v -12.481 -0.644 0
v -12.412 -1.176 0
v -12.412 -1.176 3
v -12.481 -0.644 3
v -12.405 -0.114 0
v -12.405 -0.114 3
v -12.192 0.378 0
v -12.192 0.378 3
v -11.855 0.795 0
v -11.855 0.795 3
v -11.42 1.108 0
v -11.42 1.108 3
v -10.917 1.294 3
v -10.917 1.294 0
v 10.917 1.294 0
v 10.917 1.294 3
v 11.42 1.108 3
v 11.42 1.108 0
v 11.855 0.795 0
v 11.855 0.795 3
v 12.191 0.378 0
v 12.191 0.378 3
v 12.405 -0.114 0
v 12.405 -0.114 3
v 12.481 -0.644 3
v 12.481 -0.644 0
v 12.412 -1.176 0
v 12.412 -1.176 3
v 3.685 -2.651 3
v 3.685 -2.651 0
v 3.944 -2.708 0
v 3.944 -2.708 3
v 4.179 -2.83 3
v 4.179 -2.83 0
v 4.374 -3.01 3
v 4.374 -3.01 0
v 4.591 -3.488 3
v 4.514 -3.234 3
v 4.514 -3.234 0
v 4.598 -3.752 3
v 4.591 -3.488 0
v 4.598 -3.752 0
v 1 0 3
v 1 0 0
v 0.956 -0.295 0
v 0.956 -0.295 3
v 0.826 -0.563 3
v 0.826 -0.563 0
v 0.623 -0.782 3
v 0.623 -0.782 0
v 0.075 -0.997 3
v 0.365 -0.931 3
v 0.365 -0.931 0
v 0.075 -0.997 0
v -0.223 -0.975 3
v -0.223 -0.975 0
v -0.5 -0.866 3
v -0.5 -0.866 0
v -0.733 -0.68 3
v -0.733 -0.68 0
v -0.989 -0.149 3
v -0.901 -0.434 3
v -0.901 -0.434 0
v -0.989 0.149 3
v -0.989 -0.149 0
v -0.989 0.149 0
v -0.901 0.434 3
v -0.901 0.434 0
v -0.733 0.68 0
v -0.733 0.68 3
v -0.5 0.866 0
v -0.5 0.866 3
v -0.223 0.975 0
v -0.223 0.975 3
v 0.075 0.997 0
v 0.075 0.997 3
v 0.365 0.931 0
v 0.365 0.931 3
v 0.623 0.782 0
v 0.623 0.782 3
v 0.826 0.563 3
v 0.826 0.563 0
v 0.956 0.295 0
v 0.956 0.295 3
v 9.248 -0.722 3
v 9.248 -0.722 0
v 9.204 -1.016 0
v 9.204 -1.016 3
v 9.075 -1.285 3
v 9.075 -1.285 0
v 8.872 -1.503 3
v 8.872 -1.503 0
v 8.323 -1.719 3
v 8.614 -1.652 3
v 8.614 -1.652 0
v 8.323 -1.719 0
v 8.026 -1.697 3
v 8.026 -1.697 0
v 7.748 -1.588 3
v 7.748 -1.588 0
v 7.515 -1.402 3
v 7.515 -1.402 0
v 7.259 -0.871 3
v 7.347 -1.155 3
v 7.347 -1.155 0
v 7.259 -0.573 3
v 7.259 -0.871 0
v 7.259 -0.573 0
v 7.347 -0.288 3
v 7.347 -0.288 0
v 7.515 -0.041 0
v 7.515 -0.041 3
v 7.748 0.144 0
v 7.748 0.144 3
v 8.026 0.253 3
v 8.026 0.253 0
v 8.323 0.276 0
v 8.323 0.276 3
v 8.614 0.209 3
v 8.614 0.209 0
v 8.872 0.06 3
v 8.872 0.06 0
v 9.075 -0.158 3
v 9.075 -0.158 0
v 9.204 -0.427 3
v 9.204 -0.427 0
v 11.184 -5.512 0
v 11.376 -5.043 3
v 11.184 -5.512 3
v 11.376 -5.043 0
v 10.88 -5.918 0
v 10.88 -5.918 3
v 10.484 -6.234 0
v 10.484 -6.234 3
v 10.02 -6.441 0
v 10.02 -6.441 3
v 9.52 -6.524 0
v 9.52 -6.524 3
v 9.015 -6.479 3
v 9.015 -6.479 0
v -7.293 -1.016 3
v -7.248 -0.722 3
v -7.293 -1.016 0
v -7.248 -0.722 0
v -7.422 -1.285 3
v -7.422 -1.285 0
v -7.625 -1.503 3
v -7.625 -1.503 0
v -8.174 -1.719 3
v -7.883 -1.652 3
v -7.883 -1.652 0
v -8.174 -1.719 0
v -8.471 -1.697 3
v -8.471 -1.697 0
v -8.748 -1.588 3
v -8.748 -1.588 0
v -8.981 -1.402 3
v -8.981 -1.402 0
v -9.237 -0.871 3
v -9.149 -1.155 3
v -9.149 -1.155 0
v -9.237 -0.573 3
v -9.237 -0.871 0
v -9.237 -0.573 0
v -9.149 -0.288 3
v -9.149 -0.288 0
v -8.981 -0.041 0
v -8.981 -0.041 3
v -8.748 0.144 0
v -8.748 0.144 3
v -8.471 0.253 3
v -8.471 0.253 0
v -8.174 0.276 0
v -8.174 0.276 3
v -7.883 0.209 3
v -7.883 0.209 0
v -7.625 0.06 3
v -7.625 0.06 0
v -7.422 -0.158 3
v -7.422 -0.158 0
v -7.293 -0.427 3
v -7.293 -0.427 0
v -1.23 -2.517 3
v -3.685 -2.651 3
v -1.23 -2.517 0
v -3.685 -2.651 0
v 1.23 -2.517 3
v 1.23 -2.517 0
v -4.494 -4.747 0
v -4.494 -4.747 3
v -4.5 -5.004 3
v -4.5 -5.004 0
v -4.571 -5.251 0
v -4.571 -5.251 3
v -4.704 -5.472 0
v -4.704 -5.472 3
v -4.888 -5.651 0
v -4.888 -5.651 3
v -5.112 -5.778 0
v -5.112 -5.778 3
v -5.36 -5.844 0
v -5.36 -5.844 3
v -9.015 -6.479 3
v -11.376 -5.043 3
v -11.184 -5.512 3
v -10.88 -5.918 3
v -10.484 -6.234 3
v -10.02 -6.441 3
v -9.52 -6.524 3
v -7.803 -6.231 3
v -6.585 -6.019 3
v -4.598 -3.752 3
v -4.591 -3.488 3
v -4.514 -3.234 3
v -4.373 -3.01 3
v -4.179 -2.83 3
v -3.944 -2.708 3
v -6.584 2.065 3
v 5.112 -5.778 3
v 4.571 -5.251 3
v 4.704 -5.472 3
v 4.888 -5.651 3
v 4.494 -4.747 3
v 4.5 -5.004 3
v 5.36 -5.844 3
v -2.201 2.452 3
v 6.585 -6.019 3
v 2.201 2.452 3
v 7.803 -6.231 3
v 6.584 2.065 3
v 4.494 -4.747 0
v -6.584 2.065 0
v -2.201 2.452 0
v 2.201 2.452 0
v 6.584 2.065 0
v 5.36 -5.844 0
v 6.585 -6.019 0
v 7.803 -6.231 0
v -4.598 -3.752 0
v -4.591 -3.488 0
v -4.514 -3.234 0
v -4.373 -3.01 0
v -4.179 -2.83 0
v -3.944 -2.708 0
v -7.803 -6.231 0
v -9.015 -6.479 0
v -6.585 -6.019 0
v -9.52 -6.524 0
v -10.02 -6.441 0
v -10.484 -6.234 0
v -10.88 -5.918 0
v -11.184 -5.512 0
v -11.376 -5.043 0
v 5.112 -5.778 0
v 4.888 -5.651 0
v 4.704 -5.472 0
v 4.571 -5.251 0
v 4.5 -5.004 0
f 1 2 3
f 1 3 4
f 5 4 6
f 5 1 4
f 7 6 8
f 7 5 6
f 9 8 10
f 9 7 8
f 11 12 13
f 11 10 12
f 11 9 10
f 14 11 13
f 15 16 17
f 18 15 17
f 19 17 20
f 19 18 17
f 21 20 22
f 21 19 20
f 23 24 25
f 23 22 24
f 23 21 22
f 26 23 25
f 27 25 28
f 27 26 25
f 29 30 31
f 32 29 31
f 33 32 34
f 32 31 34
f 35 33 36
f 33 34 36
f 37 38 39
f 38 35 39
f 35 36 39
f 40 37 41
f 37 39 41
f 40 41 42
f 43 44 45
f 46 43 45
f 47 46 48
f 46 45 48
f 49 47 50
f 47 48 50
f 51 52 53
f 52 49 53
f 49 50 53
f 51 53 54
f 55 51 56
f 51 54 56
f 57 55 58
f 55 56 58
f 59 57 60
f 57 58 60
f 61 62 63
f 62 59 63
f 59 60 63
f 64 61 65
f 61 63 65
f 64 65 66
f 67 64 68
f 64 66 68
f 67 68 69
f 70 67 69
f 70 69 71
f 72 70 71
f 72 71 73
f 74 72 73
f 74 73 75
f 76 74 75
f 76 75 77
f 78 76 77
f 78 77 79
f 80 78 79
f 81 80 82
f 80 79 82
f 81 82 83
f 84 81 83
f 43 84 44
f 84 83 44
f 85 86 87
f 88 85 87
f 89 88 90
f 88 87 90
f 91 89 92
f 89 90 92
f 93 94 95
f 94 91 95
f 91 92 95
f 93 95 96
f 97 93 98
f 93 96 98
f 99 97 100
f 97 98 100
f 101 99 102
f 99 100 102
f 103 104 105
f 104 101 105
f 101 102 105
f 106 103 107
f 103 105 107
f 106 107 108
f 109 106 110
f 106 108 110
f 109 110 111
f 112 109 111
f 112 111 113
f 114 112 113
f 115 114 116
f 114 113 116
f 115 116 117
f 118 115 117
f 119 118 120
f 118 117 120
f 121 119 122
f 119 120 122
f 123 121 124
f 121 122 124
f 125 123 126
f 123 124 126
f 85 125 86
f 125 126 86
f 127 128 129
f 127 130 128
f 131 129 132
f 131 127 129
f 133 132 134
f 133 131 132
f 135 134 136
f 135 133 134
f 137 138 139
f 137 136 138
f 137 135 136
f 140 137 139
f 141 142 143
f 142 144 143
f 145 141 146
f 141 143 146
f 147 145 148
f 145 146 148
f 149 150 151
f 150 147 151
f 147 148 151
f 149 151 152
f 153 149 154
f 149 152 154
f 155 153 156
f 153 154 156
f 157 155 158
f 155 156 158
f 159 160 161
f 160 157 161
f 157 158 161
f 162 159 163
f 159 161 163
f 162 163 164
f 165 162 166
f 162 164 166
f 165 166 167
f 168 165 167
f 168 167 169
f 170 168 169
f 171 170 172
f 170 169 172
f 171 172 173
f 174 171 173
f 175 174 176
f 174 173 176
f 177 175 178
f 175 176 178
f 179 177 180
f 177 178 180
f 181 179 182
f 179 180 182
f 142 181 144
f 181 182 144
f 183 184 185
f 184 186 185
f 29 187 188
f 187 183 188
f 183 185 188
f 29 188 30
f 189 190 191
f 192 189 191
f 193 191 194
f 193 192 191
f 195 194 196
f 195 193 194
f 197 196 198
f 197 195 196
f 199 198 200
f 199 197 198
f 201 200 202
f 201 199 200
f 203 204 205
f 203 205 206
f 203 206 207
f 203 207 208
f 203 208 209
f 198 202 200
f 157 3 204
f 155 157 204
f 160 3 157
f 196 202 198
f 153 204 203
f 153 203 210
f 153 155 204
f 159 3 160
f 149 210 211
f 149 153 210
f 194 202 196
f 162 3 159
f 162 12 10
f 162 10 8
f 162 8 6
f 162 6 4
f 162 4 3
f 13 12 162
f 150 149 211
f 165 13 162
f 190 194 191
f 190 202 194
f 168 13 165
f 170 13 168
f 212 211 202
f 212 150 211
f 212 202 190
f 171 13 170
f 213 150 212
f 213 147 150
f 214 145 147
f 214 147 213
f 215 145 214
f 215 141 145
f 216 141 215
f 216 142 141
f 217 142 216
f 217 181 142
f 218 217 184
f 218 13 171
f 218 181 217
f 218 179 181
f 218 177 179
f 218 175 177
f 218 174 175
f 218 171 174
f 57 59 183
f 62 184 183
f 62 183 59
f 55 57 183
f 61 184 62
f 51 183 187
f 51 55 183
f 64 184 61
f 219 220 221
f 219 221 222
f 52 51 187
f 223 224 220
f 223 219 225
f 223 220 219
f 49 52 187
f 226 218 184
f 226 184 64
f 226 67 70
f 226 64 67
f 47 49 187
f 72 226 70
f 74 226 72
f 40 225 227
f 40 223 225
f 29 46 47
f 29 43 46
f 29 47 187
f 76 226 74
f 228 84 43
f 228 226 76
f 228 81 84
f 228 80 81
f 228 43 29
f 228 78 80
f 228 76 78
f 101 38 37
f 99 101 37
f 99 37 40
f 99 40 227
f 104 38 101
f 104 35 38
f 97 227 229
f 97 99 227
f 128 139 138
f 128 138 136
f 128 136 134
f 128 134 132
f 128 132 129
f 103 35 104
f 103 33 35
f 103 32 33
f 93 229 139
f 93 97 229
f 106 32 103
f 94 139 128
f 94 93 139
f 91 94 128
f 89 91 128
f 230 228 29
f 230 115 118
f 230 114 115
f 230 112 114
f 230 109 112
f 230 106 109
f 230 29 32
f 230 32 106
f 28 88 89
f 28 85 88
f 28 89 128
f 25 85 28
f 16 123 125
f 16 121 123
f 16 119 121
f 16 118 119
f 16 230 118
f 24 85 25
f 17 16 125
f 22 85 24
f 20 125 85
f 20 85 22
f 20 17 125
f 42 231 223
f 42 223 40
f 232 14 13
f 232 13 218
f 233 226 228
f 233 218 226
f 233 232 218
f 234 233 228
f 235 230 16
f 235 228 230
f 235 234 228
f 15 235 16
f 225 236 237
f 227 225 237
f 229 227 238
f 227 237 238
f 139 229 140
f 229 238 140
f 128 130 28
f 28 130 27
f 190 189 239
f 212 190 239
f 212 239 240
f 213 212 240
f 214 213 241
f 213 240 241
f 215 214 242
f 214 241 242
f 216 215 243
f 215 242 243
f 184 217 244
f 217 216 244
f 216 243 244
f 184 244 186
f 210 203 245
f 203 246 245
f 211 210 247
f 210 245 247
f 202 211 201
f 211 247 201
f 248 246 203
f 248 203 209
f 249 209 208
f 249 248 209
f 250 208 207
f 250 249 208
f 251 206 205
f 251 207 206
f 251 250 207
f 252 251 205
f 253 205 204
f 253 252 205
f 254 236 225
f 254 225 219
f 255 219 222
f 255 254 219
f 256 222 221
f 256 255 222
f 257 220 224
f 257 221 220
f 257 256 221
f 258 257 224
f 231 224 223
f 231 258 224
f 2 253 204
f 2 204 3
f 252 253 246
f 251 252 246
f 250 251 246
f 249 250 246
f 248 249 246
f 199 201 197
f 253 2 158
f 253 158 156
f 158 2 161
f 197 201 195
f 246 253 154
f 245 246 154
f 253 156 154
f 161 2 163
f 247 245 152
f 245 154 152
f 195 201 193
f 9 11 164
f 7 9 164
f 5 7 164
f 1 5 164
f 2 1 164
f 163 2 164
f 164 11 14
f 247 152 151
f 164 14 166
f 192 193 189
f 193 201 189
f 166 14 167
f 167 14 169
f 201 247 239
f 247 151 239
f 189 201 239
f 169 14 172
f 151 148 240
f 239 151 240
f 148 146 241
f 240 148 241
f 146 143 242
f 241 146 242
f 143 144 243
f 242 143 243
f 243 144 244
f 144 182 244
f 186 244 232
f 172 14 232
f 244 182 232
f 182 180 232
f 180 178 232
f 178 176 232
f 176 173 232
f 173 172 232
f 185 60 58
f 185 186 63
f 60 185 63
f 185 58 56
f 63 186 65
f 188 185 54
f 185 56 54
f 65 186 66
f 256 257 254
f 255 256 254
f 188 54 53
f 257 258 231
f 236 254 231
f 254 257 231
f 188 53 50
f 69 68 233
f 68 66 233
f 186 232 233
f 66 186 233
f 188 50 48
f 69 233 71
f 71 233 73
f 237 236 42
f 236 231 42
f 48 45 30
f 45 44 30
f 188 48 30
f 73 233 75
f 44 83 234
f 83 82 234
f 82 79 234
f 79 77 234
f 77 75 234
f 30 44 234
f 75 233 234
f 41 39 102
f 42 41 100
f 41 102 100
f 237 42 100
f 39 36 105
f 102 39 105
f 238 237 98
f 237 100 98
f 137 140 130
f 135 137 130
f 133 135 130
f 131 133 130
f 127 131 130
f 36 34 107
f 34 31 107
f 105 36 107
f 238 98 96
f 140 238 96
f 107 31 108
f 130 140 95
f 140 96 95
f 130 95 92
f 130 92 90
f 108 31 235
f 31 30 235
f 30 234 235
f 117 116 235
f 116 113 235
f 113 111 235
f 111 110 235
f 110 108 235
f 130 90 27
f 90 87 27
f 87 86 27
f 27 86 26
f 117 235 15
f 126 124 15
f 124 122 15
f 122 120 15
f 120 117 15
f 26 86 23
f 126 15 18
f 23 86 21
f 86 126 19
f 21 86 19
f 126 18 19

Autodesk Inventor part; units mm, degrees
ref_plane "YZ Plane" through (0, 0, 0) normal (1, 0, 0) x (0, 1, 0)
ref_plane "XZ Plane" through (0, 0, 0) normal (0, 1, 0) x (-1, 0, 0)
ref_plane "XY Plane" through (0, 0, 0) normal (0, 0, 1) x (1, 0, 0)
sketch "Sketch1" plane through (0, 0, 0) normal (0, 0, 1) x (1, 0, 0)
  circle A0 centre (0, 0) radius 1
  arc A1 (10.9174, 1.2936) -> (-10.9174, 1.2936) centre (0, -47.5) ccw
  line L0 (-11.3763, -5.0432) -> (-12.4125, -1.1758)
  line L1 (0, -47.5) -> (0, 2.5) construction
  line L2 (11.3763, -5.0432) -> (12.4125, -1.1758)
  line L3 (-10.8704, -6.9311) -> (0, -47.5) construction
  line L4 (-4.4935, -4.7471) -> (-4.5981, -3.7523)
  line L5 (4.4935, -4.7471) -> (4.5981, -3.7523)
  arc A2 (9.0151, -6.4789) -> (5.3604, -5.8435) centre (0, -47.5) ccw
  arc A3 (-5.3604, -5.8435) -> (-9.0151, -6.4789) centre (0, -47.5) ccw
  line L6 (0, -47.5) -> (-4.3902, -5.7301) construction
  arc A4 (3.6854, -2.6512) -> (-3.6854, -2.6512) centre (0, -47.5) ccw
  circle A5 centre (0, -47.5) radius 47.5 construction
  circle A6 centre (8.2483, -0.7216) radius 1
  circle A7 centre (-8.2483, -0.7216) radius 1
  line L7 (0, -47.5) -> (-8.2483, -0.7216) construction
  arc A8 (-10.9174, 1.2936) -> (-12.4125, -1.1758) centre (-10.4807, -0.6582) ccw
  arc A9 (-11.3763, -5.0432) -> (-9.0151, -6.4789) centre (-9.4444, -4.5256) ccw
  arc A10 (12.4125, -1.1758) -> (10.9174, 1.2936) centre (10.4807, -0.6582) ccw
  arc A11 (9.0151, -6.4789) -> (11.3763, -5.0432) centre (9.4444, -4.5256) ccw
  arc A12 (-3.6854, -2.6512) -> (-4.5981, -3.7523) centre (-3.6035, -3.6478) ccw
  arc A13 (4.5981, -3.7523) -> (3.6854, -2.6512) centre (3.6035, -3.6478) ccw
  arc A14 (4.4935, -4.7471) -> (5.3604, -5.8435) centre (5.488, -4.8517) ccw
  arc A15 (-5.3604, -5.8435) -> (-4.4935, -4.7471) centre (-5.488, -4.8517) ccw
  point P0 (-12.941, 0.7963)
  point P1 (12.941, 0.7963)
  point P2 (-10.8704, -6.9311)
  point P3 (10.8704, -6.9311)
  point P4 (-4.7038, -2.7465)
  point P5 (4.7038, -2.7465)
  point P6 (-4.3902, -5.7301)
  point P7 (4.3902, -5.7301)
  dimension "d0" = 2
  dimension "d1" = 100
  dimension "d2" = 47.5
  dimension "d4" = 30
  dimension "d5" = 15
  dimension "d7" = 12
  dimension "d8" = 42
  dimension "d9" = 45
  dimension "d10" = 2
  dimension "d11" = 10
  dimension "d12" = 2
  dimension "d13" = 1
extrude "Extrusion1" add sketch "Sketch1" along normal blind 3
properties part number "bump_sensor_mount"
